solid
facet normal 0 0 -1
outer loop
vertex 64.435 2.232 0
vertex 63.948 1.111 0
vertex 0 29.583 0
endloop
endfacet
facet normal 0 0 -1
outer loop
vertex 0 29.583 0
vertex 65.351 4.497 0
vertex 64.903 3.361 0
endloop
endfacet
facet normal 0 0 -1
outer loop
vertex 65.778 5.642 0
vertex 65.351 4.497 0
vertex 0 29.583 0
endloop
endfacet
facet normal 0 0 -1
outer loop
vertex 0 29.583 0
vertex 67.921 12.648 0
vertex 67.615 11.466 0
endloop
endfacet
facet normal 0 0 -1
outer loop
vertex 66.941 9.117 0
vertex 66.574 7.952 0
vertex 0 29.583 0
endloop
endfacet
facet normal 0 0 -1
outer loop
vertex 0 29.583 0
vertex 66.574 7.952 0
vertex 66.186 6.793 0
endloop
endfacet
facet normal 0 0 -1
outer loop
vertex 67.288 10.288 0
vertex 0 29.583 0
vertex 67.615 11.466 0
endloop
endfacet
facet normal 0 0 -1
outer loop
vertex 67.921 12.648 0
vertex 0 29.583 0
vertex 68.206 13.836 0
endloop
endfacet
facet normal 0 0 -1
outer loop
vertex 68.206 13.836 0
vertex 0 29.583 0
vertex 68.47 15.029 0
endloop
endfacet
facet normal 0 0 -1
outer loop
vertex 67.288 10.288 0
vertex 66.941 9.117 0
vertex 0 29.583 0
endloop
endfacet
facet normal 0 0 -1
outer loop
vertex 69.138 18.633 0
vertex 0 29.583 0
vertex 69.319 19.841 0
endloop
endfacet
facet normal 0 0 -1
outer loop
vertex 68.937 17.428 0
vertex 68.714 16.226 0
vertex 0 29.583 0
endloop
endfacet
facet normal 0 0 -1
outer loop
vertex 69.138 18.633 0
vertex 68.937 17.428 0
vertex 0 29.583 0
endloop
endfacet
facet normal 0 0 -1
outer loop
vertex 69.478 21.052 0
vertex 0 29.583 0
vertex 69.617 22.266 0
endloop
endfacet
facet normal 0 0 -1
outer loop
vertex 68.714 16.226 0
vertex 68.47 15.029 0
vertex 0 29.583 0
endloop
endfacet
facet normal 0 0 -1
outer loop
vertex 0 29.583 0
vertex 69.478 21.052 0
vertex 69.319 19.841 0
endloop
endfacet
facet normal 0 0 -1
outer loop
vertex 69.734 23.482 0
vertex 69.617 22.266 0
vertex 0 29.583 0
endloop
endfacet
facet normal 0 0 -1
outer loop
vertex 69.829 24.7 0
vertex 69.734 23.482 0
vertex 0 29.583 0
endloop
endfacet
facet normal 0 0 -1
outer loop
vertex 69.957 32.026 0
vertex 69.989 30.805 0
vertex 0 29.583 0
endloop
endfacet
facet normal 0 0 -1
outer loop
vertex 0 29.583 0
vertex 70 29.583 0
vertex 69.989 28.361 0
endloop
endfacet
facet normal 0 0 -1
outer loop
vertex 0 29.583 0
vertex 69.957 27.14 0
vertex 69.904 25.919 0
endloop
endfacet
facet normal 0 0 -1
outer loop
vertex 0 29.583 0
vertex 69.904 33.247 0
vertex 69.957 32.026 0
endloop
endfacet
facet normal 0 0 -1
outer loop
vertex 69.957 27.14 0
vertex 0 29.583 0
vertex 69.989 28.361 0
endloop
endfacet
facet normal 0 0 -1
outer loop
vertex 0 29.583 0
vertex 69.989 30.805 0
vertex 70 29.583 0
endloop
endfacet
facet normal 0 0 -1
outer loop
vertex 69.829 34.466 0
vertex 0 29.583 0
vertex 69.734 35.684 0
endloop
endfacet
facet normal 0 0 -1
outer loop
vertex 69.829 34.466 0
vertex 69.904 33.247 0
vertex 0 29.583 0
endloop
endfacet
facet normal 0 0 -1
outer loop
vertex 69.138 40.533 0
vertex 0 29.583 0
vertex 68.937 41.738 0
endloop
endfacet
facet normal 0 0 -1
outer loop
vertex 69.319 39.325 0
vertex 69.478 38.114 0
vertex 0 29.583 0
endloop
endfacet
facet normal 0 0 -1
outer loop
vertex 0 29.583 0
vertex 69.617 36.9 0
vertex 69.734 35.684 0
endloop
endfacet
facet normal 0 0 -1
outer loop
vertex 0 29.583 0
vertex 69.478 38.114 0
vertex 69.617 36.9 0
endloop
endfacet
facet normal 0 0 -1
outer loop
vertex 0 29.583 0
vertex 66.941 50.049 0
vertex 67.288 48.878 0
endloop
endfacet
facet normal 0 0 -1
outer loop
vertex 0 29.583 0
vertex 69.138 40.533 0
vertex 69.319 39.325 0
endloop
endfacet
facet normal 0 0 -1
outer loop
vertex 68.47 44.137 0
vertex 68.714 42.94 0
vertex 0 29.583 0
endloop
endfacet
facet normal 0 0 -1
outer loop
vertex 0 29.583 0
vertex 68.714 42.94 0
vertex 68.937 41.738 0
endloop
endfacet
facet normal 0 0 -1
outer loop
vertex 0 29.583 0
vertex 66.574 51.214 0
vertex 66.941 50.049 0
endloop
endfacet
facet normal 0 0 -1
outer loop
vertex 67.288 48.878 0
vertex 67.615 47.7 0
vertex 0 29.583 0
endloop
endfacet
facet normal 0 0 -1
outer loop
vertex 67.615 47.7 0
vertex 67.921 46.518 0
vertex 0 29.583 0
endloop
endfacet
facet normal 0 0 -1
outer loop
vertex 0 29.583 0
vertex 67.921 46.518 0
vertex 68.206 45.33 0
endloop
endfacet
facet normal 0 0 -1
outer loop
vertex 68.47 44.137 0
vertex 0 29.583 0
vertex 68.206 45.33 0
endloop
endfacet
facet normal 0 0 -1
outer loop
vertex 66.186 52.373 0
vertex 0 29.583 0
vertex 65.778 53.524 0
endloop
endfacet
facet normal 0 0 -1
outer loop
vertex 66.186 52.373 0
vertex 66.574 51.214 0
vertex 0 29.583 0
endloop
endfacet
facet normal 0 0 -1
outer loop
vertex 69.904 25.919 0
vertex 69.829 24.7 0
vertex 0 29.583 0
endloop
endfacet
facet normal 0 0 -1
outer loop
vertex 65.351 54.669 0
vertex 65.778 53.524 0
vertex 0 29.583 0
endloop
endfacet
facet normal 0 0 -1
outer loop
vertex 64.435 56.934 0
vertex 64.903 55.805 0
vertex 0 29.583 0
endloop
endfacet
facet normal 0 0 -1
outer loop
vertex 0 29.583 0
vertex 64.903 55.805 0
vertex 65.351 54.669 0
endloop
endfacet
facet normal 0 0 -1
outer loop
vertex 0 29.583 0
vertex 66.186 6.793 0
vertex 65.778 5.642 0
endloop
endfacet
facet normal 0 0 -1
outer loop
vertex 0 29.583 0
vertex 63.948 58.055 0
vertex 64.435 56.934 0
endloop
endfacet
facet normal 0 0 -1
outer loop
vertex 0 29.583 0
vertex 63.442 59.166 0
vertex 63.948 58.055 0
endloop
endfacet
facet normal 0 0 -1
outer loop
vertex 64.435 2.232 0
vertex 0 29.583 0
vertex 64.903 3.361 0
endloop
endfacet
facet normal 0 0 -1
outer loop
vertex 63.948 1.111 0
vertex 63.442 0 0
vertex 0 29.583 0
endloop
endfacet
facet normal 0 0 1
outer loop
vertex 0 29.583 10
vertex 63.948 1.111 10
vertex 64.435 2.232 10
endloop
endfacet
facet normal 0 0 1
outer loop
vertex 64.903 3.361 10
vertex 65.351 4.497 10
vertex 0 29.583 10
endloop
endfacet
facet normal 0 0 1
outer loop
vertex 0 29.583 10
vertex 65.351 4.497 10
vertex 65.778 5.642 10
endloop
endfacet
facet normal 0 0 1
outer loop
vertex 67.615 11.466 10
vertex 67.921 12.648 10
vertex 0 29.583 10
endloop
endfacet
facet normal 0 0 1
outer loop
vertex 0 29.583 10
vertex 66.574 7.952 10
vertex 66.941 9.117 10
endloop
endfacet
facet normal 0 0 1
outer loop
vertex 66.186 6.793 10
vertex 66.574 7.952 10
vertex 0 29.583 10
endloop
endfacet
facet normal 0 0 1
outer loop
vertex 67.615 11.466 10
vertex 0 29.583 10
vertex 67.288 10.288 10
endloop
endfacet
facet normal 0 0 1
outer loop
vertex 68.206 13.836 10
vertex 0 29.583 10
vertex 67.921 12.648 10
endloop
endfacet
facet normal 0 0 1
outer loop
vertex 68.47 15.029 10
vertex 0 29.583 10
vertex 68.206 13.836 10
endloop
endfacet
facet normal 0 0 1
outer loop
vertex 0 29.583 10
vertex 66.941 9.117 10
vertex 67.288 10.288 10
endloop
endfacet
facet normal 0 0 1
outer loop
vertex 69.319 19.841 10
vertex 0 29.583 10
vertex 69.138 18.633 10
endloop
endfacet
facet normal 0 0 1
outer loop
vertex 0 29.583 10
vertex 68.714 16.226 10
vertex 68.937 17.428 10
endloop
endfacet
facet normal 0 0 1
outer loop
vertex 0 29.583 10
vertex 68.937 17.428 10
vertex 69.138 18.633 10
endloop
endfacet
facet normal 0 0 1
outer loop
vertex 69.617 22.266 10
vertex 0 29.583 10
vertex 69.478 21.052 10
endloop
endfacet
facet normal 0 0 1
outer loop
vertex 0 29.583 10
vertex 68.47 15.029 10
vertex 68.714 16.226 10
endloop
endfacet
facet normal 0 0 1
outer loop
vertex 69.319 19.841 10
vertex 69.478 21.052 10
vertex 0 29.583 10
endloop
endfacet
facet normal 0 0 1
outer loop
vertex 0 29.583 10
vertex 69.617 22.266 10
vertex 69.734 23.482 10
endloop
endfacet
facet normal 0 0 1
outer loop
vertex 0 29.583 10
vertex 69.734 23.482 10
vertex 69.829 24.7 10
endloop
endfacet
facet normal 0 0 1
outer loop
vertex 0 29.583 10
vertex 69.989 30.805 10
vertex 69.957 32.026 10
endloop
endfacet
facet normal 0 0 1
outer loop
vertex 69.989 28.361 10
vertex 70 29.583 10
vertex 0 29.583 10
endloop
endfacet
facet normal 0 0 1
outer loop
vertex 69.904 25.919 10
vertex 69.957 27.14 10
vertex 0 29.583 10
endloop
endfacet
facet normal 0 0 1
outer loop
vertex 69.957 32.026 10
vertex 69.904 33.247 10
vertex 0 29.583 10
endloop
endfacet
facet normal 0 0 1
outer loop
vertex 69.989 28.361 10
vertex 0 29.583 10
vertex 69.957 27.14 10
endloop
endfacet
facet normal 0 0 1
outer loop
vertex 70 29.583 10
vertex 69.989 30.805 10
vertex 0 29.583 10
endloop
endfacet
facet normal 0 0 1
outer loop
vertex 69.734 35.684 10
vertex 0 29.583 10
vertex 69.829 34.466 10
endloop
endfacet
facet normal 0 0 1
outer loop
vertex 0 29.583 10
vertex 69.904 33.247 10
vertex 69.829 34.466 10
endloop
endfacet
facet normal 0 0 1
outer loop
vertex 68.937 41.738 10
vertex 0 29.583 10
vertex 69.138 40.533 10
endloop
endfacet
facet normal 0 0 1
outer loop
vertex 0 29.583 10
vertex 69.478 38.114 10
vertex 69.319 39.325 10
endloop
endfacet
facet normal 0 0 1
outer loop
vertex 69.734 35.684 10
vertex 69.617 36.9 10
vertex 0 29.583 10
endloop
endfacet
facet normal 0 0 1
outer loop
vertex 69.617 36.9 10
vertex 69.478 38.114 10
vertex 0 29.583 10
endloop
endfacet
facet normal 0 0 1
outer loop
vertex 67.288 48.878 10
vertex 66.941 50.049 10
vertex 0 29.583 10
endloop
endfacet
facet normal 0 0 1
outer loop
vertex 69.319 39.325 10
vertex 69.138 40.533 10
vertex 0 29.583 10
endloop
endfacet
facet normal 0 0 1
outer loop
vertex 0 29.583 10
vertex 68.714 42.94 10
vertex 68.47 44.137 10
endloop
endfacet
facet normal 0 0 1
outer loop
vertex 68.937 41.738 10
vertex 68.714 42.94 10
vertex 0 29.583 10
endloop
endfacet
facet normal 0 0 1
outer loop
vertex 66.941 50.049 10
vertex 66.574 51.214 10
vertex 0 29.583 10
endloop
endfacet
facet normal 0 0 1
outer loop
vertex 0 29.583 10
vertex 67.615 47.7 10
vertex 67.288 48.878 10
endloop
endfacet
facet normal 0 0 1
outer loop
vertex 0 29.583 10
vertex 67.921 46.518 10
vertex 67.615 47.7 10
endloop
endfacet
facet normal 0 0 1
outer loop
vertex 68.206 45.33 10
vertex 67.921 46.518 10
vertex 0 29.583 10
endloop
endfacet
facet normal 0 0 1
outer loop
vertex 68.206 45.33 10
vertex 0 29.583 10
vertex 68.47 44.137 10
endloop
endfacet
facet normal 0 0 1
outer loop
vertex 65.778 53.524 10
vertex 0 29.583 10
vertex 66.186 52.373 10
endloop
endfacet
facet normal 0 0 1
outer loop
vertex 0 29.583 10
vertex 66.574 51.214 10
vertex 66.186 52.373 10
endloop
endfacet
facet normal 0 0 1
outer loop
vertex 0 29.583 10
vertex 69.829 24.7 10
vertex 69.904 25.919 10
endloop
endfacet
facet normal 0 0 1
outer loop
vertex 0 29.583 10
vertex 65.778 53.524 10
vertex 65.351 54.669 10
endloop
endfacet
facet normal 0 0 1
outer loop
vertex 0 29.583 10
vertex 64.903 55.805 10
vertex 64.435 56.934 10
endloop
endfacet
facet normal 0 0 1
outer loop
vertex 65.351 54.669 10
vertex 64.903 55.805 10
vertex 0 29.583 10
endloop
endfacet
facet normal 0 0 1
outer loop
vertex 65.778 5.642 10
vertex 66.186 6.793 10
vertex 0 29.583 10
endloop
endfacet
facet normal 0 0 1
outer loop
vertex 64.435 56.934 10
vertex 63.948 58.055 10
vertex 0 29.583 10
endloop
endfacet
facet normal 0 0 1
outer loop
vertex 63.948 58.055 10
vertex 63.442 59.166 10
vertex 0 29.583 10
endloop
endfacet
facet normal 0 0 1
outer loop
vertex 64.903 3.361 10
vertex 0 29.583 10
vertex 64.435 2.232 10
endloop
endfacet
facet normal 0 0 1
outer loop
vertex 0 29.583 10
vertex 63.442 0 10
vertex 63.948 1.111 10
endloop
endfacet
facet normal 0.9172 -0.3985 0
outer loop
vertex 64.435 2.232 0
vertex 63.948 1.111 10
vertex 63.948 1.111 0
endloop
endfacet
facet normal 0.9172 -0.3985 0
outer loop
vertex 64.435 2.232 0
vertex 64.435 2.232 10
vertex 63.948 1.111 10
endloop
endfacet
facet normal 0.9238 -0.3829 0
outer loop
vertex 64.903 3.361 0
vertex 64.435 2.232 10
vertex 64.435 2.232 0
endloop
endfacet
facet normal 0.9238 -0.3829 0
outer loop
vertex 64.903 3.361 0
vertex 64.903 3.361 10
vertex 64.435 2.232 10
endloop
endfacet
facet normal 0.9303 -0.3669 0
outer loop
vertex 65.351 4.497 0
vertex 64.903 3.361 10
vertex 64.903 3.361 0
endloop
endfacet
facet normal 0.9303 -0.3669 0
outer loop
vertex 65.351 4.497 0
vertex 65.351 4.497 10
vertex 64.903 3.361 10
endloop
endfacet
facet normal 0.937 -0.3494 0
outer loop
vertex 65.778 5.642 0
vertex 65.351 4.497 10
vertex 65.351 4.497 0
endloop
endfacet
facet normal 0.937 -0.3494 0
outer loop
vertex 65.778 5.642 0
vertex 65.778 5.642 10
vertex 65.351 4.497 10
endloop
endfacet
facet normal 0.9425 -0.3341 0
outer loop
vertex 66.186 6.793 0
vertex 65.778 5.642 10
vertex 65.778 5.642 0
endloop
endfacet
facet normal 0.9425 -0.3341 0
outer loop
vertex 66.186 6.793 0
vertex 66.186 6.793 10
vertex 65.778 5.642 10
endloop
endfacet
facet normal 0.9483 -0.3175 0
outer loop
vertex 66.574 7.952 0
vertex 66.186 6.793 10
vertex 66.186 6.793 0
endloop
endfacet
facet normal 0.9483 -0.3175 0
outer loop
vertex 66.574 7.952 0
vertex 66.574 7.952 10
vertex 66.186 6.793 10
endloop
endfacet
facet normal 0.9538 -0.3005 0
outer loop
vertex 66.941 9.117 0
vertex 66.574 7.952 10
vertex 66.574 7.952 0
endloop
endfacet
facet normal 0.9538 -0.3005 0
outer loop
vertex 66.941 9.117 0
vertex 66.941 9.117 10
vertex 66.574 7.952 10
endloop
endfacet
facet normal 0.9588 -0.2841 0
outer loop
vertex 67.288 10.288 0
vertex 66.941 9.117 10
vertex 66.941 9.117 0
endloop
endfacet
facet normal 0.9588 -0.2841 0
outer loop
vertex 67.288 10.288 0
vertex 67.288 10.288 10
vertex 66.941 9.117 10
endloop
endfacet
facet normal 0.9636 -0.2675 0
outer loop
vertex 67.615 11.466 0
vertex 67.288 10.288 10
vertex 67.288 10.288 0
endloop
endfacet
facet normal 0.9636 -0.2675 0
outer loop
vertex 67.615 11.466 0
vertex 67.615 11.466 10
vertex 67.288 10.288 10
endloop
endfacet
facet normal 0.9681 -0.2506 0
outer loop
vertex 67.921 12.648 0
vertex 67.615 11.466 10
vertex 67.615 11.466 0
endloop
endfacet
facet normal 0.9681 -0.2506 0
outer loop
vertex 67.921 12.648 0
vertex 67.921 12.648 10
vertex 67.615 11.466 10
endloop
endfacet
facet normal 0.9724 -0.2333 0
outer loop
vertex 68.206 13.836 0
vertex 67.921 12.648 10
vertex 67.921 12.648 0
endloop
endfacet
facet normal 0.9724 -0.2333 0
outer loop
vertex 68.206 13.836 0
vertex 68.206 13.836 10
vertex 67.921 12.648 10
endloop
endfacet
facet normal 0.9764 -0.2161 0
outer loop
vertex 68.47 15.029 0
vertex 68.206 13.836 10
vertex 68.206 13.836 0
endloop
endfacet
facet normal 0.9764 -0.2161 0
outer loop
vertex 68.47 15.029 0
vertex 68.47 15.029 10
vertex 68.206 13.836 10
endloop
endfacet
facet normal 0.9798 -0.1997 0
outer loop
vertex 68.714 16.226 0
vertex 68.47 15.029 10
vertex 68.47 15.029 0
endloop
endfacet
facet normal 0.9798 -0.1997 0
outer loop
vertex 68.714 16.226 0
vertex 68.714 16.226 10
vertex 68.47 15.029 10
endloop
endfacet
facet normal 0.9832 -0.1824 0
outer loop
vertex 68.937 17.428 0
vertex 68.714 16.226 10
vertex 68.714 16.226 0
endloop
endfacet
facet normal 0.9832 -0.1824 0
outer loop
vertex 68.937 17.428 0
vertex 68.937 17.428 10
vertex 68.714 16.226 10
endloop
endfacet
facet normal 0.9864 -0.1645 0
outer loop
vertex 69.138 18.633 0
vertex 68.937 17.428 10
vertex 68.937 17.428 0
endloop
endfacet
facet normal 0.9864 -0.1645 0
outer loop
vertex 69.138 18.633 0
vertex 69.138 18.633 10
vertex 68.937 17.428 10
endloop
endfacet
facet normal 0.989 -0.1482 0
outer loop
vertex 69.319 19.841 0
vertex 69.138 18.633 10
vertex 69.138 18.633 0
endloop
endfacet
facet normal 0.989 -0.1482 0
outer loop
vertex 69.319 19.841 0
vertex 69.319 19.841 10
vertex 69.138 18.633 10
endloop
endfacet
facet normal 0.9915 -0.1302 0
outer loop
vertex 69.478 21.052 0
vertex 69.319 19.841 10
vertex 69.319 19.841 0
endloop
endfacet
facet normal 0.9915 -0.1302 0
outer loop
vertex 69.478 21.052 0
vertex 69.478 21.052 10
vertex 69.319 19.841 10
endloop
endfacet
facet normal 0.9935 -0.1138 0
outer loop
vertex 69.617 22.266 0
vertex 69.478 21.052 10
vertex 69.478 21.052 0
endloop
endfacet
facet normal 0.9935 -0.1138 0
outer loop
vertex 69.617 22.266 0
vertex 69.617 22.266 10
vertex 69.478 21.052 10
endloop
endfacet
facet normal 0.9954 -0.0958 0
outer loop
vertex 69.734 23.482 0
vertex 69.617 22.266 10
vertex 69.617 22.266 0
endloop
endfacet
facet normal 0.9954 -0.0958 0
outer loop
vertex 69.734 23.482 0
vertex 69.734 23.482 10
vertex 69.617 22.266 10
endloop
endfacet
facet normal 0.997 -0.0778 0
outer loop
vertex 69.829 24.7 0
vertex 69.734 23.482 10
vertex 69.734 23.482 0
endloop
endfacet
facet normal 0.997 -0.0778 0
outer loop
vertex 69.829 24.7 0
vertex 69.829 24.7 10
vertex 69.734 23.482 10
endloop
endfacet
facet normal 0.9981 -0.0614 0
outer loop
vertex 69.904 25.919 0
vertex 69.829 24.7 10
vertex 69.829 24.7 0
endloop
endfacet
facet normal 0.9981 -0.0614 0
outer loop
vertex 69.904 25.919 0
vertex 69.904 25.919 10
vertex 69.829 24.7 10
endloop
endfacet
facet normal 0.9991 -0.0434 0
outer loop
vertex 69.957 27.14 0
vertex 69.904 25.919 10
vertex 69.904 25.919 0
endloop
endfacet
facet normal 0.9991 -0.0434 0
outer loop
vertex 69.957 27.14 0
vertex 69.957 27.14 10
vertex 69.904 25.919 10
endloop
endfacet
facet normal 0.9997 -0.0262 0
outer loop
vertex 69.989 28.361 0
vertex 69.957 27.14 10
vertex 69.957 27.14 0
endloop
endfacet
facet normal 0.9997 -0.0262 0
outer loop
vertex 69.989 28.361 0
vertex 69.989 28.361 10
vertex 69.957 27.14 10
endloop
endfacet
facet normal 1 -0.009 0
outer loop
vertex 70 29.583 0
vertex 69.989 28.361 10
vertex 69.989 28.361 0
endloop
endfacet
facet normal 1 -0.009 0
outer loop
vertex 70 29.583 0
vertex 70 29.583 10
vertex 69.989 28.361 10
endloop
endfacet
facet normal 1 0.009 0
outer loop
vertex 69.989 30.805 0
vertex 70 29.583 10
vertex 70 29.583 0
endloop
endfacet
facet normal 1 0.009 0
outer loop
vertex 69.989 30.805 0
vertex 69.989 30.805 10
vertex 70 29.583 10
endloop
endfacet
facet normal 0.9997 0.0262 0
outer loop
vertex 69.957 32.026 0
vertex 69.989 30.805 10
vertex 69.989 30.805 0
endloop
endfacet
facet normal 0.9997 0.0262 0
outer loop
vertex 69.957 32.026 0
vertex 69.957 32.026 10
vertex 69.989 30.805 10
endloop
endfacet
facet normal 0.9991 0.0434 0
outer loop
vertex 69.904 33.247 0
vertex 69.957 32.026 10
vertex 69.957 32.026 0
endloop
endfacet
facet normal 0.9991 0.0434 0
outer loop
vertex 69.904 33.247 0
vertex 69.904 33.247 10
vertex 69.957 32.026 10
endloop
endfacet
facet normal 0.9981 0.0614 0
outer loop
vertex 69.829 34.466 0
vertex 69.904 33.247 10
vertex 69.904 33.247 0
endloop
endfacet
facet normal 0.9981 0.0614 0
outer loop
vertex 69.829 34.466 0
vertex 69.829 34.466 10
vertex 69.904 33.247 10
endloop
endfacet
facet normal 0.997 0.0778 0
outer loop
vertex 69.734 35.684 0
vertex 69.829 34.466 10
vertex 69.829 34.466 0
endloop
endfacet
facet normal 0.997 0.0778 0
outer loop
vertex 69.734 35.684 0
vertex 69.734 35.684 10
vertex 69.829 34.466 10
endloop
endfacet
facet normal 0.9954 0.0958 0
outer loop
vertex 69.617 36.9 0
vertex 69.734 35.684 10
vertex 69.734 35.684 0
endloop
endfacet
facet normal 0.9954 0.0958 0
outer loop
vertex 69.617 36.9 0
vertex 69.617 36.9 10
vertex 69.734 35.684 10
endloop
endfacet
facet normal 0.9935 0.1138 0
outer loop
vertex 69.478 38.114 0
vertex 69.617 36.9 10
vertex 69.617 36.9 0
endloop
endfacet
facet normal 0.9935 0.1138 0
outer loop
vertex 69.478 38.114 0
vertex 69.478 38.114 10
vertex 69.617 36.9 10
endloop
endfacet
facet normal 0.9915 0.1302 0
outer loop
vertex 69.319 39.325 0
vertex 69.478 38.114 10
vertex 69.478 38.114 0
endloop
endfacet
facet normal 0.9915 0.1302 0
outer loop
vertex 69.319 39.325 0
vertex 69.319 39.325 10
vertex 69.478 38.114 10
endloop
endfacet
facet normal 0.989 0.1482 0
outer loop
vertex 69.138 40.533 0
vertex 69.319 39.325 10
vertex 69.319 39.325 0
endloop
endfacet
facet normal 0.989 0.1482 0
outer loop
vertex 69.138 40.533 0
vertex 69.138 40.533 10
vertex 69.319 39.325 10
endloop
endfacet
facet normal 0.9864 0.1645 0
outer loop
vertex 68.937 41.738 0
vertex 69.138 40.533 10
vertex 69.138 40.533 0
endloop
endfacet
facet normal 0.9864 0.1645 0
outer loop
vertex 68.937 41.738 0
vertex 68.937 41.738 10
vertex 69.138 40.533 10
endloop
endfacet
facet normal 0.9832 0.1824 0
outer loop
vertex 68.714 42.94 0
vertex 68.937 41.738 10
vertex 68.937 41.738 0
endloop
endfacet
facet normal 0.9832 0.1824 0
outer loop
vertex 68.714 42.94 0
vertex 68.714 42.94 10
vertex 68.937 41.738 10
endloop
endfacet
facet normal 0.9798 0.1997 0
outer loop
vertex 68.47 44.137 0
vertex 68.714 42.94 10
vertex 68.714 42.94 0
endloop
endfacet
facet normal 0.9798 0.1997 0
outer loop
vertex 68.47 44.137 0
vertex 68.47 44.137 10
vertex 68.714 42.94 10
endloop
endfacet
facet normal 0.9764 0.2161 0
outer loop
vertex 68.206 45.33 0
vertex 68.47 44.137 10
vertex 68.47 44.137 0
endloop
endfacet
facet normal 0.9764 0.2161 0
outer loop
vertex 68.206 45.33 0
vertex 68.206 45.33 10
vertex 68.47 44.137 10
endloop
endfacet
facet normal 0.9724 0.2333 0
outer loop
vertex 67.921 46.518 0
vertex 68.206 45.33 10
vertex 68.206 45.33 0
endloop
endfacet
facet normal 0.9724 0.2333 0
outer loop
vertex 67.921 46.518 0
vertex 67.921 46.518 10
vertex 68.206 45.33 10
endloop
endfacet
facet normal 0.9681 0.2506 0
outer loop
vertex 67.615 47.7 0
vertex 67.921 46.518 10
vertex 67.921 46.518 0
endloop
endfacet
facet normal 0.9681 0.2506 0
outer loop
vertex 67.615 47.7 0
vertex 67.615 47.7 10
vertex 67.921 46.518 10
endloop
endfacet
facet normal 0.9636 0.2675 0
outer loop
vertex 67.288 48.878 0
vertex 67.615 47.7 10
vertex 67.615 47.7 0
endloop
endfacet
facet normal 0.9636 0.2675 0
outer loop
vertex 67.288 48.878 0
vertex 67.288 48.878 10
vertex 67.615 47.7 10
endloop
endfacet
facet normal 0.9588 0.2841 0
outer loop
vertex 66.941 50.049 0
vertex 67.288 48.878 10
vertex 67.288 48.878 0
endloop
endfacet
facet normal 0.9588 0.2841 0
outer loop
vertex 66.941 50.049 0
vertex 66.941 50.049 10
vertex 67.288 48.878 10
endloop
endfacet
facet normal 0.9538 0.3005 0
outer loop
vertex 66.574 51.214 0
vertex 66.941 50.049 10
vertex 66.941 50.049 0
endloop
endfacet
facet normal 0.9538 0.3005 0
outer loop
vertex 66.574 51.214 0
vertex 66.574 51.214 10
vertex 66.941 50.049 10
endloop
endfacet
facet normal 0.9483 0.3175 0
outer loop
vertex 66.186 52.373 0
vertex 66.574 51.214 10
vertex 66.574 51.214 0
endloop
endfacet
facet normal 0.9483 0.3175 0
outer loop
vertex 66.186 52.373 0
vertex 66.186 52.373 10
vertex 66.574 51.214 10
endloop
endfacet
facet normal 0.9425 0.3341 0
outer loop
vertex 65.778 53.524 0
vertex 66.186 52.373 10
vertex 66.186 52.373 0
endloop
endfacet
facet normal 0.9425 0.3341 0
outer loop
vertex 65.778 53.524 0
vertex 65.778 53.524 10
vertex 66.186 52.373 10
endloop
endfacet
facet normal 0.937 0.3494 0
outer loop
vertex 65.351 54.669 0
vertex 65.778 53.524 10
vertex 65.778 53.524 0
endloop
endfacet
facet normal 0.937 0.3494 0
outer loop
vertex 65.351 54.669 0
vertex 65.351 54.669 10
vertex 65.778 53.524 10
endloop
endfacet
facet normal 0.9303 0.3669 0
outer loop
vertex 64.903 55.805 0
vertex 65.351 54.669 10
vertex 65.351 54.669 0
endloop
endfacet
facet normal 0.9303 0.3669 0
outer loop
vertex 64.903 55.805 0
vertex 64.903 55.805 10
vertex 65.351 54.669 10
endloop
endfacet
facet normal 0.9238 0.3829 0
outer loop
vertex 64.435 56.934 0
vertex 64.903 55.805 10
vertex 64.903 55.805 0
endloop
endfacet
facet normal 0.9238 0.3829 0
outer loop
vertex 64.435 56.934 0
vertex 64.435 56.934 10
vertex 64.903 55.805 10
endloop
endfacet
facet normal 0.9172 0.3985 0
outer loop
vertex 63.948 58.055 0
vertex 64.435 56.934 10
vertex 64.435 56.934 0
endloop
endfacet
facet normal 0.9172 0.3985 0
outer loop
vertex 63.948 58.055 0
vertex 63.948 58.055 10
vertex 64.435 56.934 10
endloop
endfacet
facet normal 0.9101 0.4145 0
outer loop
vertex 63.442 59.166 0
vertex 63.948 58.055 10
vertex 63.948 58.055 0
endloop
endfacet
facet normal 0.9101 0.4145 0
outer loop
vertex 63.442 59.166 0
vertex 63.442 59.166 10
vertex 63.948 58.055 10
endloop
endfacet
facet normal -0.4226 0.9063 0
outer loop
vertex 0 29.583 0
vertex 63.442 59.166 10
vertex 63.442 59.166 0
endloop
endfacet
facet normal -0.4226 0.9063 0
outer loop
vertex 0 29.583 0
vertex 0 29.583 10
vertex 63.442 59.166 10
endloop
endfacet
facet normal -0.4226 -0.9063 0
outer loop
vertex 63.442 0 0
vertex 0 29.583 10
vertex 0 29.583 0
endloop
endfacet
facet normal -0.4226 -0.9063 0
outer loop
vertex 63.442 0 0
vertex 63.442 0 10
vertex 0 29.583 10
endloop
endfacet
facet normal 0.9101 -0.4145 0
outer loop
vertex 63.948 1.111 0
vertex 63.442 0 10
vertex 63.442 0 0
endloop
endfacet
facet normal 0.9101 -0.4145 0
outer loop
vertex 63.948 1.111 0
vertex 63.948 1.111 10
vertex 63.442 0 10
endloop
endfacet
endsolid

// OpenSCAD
$fn = 32;

// ----------------------------------------------------------------------
// Arc profile plate: sector, 52 points
// ----------------------------------------------------------------------

// --- parameters (mm) ---
sector_angle = 50;        // sector angle, degrees
sector_r = 70;            // outer radius
arc_step = 1;             // sampling step of the arc, degrees
plate_t = 10;             // plate thickness, Z

bbox_x = 2 * sector_r * sin(sector_angle / 2);  // chord of the sector
bbox_y = sector_r;  // depth of the sector (apex to arc)

profile = [[63.442, 0], [63.948, 1.111], [64.435, 2.232], [64.903, 3.361], [65.351, 4.497], [65.778, 5.642], [66.186, 6.793], [66.574, 7.952], [66.941, 9.117], [67.288, 10.288], [67.615, 11.466], [67.921, 12.648], [68.206, 13.836], [68.47, 15.029], [68.714, 16.226], [68.937, 17.428], [69.138, 18.633], [69.319, 19.841], [69.478, 21.052], [69.617, 22.266], [69.734, 23.482], [69.829, 24.7], [69.904, 25.919], [69.957, 27.14], [69.989, 28.361], [70, 29.583], [69.989, 30.805], [69.957, 32.026], [69.904, 33.247], [69.829, 34.466], [69.734, 35.684], [69.617, 36.9], [69.478, 38.114], [69.319, 39.325], [69.138, 40.533], [68.937, 41.738], [68.714, 42.94], [68.47, 44.137], [68.206, 45.33], [67.921, 46.518], [67.615, 47.7], [67.288, 48.878], [66.941, 50.049], [66.574, 51.214], [66.186, 52.373], [65.778, 53.524], [65.351, 54.669], [64.903, 55.805], [64.435, 56.934], [63.948, 58.055], [63.442, 59.166], [0, 29.583]];  // primary outline, 52 points, counter clockwise

// --- the one profile operation ---
linear_extrude(height = plate_t) polygon(points = profile);
